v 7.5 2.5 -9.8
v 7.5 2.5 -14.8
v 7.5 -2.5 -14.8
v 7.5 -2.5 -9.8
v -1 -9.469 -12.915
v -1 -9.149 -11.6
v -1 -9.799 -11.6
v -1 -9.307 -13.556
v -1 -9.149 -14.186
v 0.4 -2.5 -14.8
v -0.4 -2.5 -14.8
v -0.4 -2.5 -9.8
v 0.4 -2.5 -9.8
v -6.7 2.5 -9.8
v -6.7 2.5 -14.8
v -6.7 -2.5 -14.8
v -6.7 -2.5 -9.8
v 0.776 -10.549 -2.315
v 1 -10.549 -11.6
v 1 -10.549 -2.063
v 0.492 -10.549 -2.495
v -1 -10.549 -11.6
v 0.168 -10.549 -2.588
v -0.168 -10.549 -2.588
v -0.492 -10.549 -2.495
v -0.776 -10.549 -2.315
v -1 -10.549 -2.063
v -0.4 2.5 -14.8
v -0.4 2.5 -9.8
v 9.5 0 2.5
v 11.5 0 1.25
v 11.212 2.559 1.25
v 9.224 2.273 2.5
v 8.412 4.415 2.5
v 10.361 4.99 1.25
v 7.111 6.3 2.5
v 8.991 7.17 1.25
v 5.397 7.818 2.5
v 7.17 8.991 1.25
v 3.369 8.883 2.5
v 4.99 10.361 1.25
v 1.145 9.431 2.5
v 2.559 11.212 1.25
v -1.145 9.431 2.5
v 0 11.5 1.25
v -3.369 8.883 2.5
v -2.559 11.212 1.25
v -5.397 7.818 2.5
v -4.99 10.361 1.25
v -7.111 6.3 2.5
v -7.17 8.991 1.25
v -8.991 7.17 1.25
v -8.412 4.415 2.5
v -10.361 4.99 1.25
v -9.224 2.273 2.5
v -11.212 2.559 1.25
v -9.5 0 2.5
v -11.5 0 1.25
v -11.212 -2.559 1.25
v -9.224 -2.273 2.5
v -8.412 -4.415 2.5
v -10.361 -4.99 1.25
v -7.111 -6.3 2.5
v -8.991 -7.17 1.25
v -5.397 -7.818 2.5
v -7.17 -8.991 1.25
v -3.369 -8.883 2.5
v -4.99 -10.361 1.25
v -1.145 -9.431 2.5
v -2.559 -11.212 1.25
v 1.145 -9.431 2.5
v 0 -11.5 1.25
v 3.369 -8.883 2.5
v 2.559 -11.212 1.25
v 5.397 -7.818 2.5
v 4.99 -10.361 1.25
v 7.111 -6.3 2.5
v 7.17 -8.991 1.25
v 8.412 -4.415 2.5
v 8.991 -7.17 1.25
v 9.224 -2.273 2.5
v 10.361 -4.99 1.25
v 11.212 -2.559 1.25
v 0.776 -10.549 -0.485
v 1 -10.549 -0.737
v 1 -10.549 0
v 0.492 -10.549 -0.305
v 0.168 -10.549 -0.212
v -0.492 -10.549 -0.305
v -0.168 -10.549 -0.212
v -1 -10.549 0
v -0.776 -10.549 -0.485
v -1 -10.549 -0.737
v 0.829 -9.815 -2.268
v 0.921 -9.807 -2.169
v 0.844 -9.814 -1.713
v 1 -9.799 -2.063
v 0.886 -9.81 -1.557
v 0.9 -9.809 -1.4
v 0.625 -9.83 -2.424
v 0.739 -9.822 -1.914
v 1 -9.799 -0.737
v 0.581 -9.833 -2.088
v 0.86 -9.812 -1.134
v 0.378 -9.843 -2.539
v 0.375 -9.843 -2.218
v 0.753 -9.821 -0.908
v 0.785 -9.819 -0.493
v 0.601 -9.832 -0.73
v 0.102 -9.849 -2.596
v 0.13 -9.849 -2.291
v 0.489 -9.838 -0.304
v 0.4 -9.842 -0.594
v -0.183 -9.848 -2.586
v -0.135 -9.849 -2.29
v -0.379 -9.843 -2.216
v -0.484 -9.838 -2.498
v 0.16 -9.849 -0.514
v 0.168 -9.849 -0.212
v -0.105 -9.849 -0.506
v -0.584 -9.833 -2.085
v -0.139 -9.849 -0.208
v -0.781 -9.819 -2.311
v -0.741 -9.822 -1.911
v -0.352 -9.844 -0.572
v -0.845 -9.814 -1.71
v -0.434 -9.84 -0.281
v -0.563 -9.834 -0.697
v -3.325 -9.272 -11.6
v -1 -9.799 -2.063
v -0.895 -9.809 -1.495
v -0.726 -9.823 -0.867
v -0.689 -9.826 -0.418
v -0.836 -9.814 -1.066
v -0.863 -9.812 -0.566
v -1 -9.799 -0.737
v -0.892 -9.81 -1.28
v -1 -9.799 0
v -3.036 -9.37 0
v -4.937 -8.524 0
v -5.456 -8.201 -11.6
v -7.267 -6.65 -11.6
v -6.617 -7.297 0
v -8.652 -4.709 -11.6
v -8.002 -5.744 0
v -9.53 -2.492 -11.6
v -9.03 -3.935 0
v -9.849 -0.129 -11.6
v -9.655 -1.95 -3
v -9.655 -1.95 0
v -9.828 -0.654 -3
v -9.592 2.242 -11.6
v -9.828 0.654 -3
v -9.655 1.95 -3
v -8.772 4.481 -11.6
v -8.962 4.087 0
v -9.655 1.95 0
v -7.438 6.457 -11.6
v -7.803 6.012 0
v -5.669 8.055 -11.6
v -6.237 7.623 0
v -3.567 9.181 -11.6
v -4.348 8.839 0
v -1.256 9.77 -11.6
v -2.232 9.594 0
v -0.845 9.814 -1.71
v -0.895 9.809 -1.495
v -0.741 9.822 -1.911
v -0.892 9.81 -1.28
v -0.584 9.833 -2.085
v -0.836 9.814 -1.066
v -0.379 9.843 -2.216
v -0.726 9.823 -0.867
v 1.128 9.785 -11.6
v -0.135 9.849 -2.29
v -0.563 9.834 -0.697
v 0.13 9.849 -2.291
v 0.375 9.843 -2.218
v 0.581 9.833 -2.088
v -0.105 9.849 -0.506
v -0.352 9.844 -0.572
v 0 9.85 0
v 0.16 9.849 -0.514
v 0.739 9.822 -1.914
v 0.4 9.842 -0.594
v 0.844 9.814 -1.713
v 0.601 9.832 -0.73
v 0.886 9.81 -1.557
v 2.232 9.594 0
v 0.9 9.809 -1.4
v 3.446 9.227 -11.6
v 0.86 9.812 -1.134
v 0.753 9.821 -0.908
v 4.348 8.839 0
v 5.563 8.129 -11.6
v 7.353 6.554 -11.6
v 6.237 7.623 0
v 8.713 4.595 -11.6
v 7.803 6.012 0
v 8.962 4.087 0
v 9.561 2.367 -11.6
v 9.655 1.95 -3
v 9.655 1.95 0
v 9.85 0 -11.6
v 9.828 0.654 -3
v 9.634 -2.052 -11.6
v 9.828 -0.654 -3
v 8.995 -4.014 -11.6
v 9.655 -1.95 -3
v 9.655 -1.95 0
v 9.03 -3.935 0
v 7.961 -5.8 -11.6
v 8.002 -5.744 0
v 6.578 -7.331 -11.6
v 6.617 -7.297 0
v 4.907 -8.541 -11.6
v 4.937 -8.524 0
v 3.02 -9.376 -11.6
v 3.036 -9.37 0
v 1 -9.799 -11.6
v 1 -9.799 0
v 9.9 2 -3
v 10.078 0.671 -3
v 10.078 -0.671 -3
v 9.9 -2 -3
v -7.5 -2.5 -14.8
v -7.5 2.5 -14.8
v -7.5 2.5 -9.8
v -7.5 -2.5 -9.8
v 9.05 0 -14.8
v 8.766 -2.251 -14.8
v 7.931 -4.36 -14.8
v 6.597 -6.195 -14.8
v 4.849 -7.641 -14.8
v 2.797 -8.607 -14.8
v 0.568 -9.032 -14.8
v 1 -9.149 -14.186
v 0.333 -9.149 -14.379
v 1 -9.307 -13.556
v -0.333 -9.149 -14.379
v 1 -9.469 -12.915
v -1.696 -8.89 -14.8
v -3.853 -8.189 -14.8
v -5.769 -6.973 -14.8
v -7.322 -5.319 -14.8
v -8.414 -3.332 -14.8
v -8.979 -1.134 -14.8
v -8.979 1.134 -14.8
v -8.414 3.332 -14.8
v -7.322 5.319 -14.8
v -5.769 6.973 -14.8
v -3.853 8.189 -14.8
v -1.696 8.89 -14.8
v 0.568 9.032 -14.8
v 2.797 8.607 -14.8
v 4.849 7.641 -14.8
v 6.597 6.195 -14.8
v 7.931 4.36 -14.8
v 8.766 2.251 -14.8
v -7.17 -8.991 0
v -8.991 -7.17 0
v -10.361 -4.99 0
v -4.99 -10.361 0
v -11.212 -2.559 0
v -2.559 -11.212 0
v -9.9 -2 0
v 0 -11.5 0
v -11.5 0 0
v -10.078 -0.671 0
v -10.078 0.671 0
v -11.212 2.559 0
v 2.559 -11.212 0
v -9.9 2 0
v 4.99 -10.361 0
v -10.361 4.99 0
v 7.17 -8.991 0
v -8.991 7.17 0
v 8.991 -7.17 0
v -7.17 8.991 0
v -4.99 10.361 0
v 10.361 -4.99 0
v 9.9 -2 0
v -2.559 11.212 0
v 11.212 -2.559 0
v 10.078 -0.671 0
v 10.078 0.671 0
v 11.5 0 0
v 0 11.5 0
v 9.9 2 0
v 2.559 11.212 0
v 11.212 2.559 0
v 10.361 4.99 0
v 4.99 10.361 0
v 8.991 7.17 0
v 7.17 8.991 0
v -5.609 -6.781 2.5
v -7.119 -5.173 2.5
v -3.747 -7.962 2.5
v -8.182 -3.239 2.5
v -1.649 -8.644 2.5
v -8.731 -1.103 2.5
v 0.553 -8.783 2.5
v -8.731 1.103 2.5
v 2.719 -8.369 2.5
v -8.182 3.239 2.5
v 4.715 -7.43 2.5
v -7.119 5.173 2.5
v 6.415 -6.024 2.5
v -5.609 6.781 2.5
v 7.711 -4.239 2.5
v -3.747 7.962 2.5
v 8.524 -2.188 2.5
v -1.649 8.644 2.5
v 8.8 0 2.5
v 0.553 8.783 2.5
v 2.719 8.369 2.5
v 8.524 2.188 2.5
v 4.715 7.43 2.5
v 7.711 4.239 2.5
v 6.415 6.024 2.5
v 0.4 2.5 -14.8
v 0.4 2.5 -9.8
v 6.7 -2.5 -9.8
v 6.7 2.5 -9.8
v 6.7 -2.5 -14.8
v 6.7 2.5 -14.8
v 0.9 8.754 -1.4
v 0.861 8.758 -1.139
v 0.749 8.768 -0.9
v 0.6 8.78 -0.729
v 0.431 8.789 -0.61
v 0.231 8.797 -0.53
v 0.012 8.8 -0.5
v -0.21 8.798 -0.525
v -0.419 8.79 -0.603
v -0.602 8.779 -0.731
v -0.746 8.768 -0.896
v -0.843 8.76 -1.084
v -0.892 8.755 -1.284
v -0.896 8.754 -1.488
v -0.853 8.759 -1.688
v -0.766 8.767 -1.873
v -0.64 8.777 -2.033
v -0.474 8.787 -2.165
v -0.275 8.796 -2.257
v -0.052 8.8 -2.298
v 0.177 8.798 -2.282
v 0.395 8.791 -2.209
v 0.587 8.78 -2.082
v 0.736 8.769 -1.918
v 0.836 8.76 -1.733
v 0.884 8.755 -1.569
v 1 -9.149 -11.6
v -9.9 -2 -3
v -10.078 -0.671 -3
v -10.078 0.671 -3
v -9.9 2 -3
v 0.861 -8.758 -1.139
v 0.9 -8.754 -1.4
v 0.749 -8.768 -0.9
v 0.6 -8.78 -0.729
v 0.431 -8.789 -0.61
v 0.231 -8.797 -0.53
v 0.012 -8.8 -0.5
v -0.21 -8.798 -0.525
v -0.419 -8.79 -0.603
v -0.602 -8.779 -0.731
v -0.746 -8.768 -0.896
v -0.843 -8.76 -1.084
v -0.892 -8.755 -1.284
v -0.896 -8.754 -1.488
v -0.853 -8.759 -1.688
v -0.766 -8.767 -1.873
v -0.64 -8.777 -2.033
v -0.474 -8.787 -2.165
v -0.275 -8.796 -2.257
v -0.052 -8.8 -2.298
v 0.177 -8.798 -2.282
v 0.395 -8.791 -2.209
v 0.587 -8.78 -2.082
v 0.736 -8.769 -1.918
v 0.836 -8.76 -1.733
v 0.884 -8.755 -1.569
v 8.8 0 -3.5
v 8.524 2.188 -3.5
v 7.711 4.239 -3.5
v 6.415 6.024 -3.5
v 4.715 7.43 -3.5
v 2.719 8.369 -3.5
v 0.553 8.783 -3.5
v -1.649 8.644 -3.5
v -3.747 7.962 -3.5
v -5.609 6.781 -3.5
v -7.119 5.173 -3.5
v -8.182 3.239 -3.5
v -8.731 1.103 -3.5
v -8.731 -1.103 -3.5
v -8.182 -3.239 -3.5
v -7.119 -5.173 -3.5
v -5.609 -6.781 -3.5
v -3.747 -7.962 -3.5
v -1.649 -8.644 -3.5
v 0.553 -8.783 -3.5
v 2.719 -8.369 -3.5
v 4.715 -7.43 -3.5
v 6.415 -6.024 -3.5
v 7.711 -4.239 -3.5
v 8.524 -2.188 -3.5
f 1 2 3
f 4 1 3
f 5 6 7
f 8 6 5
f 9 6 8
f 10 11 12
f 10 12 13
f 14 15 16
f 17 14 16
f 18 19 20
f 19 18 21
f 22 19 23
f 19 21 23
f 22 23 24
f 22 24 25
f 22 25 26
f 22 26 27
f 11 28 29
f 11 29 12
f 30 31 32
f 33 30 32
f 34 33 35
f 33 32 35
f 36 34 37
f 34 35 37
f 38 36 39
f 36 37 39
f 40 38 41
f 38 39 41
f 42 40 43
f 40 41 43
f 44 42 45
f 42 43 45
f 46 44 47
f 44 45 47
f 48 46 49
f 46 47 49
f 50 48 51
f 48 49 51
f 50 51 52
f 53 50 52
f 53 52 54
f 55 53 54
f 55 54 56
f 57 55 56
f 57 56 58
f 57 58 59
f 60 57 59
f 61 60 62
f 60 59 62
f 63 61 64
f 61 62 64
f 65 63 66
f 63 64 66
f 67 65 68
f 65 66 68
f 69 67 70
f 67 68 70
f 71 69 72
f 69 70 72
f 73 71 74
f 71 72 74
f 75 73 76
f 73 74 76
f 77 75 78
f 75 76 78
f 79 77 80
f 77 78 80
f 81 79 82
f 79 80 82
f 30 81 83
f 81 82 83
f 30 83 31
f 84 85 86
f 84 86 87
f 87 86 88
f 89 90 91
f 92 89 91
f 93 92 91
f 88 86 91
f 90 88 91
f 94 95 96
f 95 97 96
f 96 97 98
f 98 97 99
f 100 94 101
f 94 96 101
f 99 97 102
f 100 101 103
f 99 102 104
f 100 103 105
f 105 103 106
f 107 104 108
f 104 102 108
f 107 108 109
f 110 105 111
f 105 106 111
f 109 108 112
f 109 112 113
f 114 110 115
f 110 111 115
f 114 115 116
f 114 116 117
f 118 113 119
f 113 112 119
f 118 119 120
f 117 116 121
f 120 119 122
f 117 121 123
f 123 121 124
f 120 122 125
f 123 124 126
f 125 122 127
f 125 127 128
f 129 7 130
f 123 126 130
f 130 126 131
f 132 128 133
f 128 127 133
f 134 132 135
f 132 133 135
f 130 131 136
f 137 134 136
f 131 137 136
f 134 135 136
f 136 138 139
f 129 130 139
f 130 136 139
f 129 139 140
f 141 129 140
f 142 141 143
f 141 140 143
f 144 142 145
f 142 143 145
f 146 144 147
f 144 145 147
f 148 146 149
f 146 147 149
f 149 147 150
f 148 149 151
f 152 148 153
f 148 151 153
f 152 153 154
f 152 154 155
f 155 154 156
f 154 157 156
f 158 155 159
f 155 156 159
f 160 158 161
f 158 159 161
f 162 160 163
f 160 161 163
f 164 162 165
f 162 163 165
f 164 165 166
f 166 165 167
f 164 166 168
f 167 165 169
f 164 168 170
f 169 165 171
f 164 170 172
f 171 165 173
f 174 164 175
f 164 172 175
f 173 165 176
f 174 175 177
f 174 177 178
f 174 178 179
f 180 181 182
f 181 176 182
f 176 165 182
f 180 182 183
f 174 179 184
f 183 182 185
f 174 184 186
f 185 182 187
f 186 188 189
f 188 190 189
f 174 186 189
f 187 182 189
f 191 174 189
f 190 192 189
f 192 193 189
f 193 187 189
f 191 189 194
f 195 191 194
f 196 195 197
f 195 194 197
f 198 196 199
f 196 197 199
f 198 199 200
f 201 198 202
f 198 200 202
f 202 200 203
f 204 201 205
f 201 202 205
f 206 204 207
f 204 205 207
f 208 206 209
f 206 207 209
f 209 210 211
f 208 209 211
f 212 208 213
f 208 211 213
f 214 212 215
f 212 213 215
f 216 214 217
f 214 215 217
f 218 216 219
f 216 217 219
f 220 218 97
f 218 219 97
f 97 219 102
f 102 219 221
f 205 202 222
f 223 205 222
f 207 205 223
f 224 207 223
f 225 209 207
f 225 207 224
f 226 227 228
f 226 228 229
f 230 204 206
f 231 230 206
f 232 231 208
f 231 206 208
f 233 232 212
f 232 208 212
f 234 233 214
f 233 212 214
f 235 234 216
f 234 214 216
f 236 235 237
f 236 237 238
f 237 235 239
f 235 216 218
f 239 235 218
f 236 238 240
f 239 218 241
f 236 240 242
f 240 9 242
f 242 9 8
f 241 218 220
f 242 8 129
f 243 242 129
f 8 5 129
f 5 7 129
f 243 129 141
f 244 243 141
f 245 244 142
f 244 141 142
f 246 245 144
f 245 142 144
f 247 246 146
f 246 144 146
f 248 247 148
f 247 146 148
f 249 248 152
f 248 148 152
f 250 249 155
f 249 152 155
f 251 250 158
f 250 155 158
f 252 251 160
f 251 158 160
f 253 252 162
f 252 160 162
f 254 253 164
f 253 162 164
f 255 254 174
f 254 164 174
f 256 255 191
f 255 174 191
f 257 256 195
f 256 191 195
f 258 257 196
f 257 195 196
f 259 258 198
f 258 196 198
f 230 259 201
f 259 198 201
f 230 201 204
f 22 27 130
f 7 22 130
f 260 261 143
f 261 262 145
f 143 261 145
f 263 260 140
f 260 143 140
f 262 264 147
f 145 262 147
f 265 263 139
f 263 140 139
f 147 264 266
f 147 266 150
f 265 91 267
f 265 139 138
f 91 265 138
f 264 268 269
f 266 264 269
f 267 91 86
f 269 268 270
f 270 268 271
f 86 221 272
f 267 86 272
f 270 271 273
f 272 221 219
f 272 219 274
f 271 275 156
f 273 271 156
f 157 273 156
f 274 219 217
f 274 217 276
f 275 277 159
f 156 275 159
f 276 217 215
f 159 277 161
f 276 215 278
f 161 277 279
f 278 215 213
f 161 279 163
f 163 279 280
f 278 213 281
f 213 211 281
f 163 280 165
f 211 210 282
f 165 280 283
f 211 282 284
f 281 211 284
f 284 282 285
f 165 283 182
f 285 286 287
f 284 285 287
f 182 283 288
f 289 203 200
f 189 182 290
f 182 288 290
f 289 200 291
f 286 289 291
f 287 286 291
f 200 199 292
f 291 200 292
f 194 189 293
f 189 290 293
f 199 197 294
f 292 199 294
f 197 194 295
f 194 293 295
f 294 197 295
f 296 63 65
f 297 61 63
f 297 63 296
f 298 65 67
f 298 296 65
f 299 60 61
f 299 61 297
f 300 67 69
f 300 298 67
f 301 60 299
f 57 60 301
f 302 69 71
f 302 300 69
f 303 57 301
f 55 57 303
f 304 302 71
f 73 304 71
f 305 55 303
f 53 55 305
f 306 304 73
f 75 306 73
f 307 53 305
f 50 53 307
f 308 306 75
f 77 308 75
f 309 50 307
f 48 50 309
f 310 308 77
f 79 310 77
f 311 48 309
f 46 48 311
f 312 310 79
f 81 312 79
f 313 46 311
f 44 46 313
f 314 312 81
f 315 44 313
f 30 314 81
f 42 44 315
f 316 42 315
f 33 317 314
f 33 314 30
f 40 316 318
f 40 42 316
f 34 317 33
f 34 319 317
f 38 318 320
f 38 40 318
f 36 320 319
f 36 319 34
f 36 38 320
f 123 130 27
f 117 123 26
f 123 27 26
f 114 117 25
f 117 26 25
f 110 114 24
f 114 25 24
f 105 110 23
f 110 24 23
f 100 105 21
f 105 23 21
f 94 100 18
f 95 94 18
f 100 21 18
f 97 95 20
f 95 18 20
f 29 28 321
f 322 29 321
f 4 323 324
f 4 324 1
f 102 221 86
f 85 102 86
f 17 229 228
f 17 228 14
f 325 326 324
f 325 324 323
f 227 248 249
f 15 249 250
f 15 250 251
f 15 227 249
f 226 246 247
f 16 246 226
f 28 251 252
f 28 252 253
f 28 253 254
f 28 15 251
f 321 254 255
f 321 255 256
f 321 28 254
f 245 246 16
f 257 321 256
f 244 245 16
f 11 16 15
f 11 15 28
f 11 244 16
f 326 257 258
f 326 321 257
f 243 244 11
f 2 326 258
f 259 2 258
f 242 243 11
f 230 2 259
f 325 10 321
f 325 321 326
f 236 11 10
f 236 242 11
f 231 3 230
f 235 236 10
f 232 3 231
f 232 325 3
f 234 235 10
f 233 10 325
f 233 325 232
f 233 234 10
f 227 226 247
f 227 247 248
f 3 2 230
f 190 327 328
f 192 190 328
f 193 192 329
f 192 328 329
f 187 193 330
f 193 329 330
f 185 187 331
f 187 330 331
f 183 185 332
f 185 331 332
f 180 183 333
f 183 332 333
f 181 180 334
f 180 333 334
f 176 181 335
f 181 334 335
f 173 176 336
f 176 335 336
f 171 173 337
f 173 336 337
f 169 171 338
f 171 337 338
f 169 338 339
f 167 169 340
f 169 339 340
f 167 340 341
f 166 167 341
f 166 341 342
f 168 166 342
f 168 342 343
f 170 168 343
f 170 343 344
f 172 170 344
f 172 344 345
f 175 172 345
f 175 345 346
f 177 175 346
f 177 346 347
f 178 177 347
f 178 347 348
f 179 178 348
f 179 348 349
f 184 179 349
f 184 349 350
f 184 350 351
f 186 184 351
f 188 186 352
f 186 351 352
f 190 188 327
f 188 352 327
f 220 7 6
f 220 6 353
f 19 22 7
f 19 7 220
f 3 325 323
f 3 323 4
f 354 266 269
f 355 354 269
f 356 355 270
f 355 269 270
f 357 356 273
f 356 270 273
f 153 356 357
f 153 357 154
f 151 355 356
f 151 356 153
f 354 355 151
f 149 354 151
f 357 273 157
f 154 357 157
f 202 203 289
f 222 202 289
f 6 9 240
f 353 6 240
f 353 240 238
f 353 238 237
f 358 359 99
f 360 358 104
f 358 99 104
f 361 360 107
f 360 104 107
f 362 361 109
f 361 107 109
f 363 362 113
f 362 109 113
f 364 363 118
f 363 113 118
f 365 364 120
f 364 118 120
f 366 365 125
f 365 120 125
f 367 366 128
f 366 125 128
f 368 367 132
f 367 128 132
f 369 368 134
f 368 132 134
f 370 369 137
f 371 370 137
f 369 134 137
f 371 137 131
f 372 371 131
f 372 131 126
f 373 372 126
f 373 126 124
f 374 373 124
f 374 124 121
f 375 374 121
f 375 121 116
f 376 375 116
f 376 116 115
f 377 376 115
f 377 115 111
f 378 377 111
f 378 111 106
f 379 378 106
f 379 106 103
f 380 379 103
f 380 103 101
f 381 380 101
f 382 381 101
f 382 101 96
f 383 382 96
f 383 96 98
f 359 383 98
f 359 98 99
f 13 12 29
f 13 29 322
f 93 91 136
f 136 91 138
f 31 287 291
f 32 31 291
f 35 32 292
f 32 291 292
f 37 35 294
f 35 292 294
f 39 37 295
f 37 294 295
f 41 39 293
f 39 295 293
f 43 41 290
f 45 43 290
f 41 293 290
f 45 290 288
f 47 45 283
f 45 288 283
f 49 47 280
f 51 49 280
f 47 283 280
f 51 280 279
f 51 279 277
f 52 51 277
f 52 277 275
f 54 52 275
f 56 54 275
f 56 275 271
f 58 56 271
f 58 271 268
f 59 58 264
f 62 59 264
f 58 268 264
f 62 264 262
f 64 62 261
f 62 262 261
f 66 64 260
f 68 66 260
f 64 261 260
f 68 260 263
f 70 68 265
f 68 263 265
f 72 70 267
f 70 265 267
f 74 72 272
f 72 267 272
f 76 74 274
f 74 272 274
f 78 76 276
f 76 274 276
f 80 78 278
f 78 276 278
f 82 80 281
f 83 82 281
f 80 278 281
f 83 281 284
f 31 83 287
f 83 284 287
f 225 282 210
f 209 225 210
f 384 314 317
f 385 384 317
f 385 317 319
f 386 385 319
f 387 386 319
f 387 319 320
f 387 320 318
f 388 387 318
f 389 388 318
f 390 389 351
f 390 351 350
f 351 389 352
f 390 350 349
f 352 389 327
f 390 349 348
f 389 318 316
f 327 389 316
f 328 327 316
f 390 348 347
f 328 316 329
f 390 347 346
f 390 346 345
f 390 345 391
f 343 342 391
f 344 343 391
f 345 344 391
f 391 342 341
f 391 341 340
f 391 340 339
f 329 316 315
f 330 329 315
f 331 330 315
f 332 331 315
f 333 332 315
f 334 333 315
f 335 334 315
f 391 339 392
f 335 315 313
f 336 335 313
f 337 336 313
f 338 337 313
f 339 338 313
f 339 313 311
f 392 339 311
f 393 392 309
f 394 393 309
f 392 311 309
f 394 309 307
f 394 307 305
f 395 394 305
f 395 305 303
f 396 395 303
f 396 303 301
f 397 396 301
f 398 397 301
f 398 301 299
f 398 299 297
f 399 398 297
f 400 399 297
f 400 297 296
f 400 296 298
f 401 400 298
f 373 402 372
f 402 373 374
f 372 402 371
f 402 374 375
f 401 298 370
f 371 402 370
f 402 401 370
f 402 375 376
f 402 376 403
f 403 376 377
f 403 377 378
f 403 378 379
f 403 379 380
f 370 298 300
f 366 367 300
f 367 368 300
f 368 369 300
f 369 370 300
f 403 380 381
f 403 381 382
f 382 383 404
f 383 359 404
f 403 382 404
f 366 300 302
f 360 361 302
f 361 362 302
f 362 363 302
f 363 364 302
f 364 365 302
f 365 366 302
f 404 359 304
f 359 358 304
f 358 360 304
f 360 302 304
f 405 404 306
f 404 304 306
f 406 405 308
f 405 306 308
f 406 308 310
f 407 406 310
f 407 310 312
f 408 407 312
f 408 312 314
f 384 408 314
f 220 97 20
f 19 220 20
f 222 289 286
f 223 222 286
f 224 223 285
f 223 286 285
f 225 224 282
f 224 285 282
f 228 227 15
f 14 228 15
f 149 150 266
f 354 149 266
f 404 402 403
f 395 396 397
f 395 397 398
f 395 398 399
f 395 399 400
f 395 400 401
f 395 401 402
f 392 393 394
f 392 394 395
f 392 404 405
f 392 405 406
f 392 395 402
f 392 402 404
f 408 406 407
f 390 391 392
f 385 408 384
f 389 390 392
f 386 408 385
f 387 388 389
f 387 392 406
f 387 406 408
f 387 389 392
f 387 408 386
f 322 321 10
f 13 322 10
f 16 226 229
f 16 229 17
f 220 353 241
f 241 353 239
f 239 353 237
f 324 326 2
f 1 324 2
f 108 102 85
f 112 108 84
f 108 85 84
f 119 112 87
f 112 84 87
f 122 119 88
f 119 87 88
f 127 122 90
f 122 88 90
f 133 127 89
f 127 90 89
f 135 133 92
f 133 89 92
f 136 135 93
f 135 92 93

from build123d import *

# Parameters (mm, degrees)
F0_R           = 11.5
F1_DEPTH       = 2.5
F2_R           = 9.85
F3_DEPTH       = 14.8
F4_SIZE2       = 3.2
F4_SIZE        = 0.8
F5_SIZE2       = 1.25
F5_SIZE        = 2
F6_R           = 8.8
F7_DEPTH       = 6
F8_W           = 0.8
F8_H           = 5
F9_DEPTH       = 5
F11_DEPTH      = 11.6
F12_W          = 2
F12_H          = 1.4
F13_DEPTH      = 3.2
F14_R          = 0.9
F15_DEPTH      = 22.0501071022
F17_END_RADIUS = 9.85
F16_R          = 1.2
F17_REACH      = 25.4442196519
F19_DEPTH      = 3


with BuildPart() as f1:
    # F0 (on Top) → F1 (new body)
    with BuildSketch(Plane.XY):
        Circle(F0_R)
    extrude(amount=F1_DEPTH)

    # F2 (on face) → F3 (join)
    with BuildSketch(Plane(origin=(0, 0, 0), x_dir=(1, 0, 0), z_dir=(0, 0, -1))):
        Circle(F2_R)
    extrude(amount=F3_DEPTH)

    # F4
    f4_edges = [f1.edges().sort_by_distance(p)[0] for p in [
        (-9.85, 0, -14.8),
    ]]
    f4_side = f1.faces().sort_by_distance((0, 0, -14.8))[0]
    chamfer(f4_edges, length=F4_SIZE, length2=F4_SIZE2, reference=f4_side)

    # F5
    f5_edges = [f1.edges().sort_by_distance(p)[0] for p in [
        (-11.5, 0, 2.5),
    ]]
    f5_side = f1.faces().sort_by_distance((0, 0, 2.5))[0]
    chamfer(f5_edges, length=F5_SIZE, length2=F5_SIZE2, reference=f5_side)

    # F6 (on face) → F7 (cut)
    with BuildSketch(Plane.XY.offset(2.5)):
        Circle(F6_R)
    extrude(amount=-F7_DEPTH, mode=Mode.SUBTRACT)

    # F8 (on face) → F9 (cut)
    with BuildSketch(Plane(origin=(0, 0, -14.8), x_dir=(1, 0, 0), z_dir=(0, 0, -1))):
        with Locations((-7.1, 0)):
            Rectangle(F8_W, F8_H)
        Rectangle(F8_W, F8_H)
        with Locations((7.1, 0)):
            Rectangle(F8_W, F8_H)
    extrude(amount=-F9_DEPTH, mode=Mode.SUBTRACT)

    # F10 (on face) → F11 (join)
    with BuildSketch(Plane(origin=(0, 0, 0), x_dir=(1, 0, 0), z_dir=(0, 0, -1))):
        with BuildLine():
            Line((-1, 10.5491071022), (-1, 9.7991071022))
            ThreePointArc((-1, 9.7991071022), (0, 9.85), (1, 9.7991071022))
            Line((1, 9.7991071022), (1, 10.5491071022))
            Line((1, 10.5491071022), (-1, 10.5491071022))
        make_face()
    extrude(amount=F11_DEPTH)

    # F12 (on face) → F13 (cut, through all)
    with BuildSketch(Plane(origin=(0, 0, -14.8), x_dir=(1, 0, 0), z_dir=(0, 0, -1))):
        with Locations((0, 9.8491071022)):
            Rectangle(F12_W, F12_H)
    extrude(amount=-F13_DEPTH, mode=Mode.SUBTRACT)

    # F14 (on face) → F15 (cut, through all)
    with BuildSketch(Plane.XZ.offset(10.5491071022)):
        with Locations((0, -1.4)):
            Circle(F14_R)
    extrude(amount=-F15_DEPTH, mode=Mode.SUBTRACT)

    f17_end = (Plane.XY.offset(-5.8) * Cylinder(F17_END_RADIUS, 124.5712732194, mode=Mode.PRIVATE)).faces().sort_by_distance((0, 9.85, -5.8))[0]
    # F16 (on face) → F17 (cut, up to the whole of a round face its end follows)
    with BuildSketch(Plane.XZ.offset(10.5491071022)):
        with Locations((0, -1.4)):
            Circle(F16_R)
    f17_long = extrude(amount=-F17_REACH, mode=Mode.PRIVATE)
    add(split(f17_long, bisect_by=f17_end, keep=Keep.ALL, mode=Mode.PRIVATE).solids().sort_by_distance((0, -10.5491071022, -1.4))[0], mode=Mode.SUBTRACT)

    # F18 (on face) → F19 (join)
    with BuildSketch(Plane(origin=(0, 0, 0), x_dir=(1, 0, 0), z_dir=(0, 0, -1))):
        with BuildLine():
            Line((-9.654950495, 1.9504950495), (-9.9, 2))
            ThreePointArc((-9.9, 2), (-10.1, 0), (-9.9, -2))
            Line((-9.9, -2), (-9.654950495, -1.9504950495))
            ThreePointArc((-9.654950495, -1.9504950495), (-9.85, 0), (-9.654950495, 1.9504950495))
        make_face()
        with BuildLine():
            Line((9.654950495, -1.9504950495), (9.9, -2))
            ThreePointArc((9.9, -2), (10.1, 0), (9.9, 2))
            Line((9.9, 2), (9.654950495, 1.9504950495))
            ThreePointArc((9.654950495, 1.9504950495), (9.85, 0), (9.654950495, -1.9504950495))
        make_face()
    extrude(amount=F19_DEPTH)


solid = f1.part
